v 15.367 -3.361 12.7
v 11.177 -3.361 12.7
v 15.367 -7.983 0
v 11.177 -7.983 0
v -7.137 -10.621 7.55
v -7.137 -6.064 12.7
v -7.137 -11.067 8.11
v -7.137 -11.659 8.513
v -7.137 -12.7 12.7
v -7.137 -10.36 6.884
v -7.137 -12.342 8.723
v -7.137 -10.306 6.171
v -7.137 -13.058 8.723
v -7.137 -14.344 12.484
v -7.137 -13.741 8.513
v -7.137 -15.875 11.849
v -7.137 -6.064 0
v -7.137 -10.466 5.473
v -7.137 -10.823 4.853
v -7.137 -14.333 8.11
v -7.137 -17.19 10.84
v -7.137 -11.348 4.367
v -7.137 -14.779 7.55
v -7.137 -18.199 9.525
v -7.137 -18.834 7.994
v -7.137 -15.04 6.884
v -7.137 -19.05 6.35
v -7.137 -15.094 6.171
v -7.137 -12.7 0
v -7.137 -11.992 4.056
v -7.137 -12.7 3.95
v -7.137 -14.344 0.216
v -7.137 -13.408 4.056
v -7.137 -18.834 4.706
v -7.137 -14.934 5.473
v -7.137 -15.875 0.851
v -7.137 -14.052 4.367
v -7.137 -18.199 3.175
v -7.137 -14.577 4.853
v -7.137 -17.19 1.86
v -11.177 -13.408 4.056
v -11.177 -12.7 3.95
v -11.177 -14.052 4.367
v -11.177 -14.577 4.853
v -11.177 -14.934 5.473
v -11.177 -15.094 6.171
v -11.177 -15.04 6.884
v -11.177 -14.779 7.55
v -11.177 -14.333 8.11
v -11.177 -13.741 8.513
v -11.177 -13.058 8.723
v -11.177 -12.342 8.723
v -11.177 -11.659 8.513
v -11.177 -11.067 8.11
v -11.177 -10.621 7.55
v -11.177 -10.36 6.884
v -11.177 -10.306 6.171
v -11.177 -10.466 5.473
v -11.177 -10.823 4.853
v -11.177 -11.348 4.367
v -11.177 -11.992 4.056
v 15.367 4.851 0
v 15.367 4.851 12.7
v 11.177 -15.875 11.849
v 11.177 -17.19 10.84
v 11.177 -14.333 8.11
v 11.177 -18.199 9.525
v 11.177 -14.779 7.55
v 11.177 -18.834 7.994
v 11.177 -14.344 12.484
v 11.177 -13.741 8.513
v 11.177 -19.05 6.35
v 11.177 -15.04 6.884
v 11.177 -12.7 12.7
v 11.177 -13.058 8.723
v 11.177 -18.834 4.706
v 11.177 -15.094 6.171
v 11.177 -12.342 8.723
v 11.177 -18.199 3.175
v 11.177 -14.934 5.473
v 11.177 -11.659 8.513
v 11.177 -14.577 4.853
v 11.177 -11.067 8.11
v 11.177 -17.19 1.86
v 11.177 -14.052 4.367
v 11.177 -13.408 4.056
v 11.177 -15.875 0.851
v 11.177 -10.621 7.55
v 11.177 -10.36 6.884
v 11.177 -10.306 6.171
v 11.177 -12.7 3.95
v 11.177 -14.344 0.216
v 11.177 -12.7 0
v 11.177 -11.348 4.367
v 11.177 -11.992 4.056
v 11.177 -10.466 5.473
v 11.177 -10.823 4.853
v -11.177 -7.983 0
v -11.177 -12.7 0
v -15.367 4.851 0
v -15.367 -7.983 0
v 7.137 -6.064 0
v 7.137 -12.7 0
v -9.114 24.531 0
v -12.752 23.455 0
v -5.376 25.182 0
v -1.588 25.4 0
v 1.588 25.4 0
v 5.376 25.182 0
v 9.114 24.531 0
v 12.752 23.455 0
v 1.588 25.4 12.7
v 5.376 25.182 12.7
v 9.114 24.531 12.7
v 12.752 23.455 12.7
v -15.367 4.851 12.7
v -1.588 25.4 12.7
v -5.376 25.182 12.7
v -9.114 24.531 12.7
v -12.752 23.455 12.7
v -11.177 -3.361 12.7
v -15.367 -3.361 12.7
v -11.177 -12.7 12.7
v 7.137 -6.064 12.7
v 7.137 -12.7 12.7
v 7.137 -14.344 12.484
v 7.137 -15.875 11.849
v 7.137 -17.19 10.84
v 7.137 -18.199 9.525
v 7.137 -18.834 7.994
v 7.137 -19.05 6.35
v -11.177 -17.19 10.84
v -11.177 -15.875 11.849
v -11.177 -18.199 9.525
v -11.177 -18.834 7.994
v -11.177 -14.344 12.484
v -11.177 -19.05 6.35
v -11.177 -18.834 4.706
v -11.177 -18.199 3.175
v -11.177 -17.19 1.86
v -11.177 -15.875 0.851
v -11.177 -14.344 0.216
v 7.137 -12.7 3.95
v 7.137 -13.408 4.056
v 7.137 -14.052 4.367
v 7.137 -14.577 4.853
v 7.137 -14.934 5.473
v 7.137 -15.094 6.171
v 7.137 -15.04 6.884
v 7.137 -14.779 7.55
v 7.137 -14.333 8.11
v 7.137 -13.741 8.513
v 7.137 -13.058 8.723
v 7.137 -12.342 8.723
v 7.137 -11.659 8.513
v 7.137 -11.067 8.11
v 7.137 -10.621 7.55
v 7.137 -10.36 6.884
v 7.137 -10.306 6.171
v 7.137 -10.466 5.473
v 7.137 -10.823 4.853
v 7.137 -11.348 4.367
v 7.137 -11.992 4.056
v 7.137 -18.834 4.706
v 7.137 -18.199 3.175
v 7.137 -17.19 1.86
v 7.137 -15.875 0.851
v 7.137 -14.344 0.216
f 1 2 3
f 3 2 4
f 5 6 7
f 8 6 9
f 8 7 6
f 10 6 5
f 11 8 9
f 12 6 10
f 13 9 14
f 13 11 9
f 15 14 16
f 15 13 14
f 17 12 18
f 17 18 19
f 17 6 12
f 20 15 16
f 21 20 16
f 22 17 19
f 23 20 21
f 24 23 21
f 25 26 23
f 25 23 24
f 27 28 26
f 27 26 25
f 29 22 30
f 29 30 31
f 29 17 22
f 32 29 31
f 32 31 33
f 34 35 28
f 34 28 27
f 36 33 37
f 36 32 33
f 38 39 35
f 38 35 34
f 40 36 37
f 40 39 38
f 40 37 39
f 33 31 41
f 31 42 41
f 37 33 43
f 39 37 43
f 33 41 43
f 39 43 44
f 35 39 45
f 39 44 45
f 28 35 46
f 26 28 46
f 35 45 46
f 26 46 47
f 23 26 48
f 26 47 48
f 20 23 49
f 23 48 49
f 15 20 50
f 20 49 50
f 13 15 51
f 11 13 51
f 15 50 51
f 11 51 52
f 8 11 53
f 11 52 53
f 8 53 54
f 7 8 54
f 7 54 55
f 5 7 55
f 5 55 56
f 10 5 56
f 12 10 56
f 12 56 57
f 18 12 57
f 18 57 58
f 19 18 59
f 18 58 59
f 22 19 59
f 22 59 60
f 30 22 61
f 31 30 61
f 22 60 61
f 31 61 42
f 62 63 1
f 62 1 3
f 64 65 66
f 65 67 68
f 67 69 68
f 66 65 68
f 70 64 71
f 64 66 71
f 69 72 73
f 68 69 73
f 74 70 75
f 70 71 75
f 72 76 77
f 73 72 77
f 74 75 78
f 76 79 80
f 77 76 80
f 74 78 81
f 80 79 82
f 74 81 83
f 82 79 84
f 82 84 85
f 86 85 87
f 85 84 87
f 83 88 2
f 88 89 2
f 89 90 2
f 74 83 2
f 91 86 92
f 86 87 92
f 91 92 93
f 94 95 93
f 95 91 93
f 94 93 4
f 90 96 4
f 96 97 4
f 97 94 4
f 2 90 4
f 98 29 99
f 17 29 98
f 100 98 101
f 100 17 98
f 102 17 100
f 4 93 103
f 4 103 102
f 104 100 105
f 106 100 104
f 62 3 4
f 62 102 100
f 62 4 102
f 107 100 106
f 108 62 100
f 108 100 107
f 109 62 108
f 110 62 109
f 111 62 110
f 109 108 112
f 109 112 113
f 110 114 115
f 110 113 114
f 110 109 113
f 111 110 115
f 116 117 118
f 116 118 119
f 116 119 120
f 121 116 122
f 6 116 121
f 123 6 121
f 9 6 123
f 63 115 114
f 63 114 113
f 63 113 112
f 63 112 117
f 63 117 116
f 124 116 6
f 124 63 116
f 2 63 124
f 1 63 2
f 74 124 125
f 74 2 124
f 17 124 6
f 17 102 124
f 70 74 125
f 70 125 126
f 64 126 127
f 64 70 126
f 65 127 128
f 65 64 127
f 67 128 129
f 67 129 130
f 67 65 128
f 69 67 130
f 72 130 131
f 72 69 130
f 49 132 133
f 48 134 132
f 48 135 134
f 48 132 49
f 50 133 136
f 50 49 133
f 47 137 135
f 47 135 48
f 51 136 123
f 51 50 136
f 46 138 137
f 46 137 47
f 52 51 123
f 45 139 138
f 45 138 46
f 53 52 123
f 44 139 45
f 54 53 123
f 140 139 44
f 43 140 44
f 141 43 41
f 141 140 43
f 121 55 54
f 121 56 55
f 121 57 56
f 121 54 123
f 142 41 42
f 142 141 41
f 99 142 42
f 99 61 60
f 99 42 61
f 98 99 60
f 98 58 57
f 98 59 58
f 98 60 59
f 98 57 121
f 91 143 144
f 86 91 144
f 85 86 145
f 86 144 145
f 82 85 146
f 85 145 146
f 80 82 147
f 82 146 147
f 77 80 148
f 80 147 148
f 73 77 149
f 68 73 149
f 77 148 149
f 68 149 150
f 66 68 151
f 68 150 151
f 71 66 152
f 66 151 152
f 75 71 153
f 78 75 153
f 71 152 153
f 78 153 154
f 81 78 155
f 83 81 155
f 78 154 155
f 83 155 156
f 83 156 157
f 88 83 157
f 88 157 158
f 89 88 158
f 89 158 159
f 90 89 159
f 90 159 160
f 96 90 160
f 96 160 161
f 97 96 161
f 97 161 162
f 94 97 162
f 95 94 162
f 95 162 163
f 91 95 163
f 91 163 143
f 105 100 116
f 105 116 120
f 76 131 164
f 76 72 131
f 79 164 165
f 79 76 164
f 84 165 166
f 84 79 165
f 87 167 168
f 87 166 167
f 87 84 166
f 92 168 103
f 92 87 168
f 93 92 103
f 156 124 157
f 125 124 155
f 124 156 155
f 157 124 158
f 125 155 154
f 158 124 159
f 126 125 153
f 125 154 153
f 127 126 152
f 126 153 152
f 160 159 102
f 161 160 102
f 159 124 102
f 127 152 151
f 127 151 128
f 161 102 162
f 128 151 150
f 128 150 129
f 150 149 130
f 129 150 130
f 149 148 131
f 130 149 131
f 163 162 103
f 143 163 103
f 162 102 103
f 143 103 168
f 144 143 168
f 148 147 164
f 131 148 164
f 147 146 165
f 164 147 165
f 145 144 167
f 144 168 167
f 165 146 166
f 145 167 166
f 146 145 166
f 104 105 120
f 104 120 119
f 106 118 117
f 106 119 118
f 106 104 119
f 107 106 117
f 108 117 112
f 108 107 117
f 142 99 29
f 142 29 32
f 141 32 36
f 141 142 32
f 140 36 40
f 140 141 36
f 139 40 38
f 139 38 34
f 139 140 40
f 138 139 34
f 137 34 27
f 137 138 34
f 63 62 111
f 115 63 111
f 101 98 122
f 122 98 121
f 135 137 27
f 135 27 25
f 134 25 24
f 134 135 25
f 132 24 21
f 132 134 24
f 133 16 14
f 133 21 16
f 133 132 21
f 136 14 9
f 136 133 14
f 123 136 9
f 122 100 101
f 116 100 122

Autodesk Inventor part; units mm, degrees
ref_plane "YZ Plane" through (0, 0, 0) normal (1, 0, 0) x (0, 1, 0)
ref_plane "XY Plane" through (0, 0, 0) normal (0, 0, 1) x (1, 0, 0)
sketch "Sketch1" plane through (0, 0, 0) normal (0, 0, 1) x (1, 0, 0)
  line L0 (0, -6.0638) -> (7.1374, -6.0638)
  line L1 (7.1374, -6.0638) -> (7.1374, -19.05)
  line L2 (7.1374, -19.05) -> (11.1772, -19.05)
  line L3 (11.1772, -19.05) -> (11.1772, 0)
  line L4 (11.1772, 0) -> (15.367, 0)
  line L5 (15.367, 0) -> (15.367, 4.8514)
  line L6 (15.367, 4.8514) -> (12.7524, 23.4552)
  arc A0 (12.7524, 23.4552) -> (1.5875, 25.4) centre (1.5875, -7.62) ccw
  line L7 (-21.5138, 0) -> (21.5138, 0) construction
  line L8 (0, -28.0365) -> (0, 34.8691) construction
  line L9 (0, -6.0638) -> (-7.1374, -6.0638)
  line L10 (-7.1374, -6.0638) -> (-7.1374, -19.05)
  line L11 (-7.1374, -19.05) -> (-11.1772, -19.05)
  line L12 (-11.1772, -19.05) -> (-11.1772, 0)
  line L13 (-11.1772, 0) -> (-15.367, 0)
  line L14 (-15.367, 0) -> (-15.367, 4.8514)
  line L15 (-15.367, 4.8514) -> (-12.7524, 23.4552)
  line L16 (7.1374, -12.7) -> (11.1772, -12.7) construction
  line L17 (-7.1374, -12.7) -> (-11.1772, -12.7) construction
  line L18 (1.5875, 25.4) -> (0, 25.4)
  arc A1 (-1.5875, 25.4) -> (-12.7524, 23.4552) centre (-1.5875, -7.62) ccw
  line L19 (-1.5875, 25.4) -> (0, 25.4)
  point P0 (0, 0)
  dimension "d1" = 30.734
  dimension "d2" = 4.1898
  dimension "d3" = 4.0398
  dimension "d4" = 6.35
  dimension "d5" = 12.7
  dimension "d6" = 17.5514
  dimension "d7" = 8
  dimension "d8" = 1.5875
  dimension "d9" = 38.1
  dimension "d10" = 33.02
extrude "Extrusion1" add sketch "Sketch1" along normal blind 12.7
hole "Hole1" at (11.1772, -12.7, 6.35) direction (-1, 0, 0) diameter 4.8006 end through all
fillet "Fillet1" radius 6.35 4 edges at (9.1573, -19.05, 12.7) (9.1573, -19.05, 0) (-9.1573, -19.05, 12.7) (-9.1573, -19.05, 0)
sketch "Sketch2" plane through (11.1772, 0, 12.7) normal (1, 0, 0) x (0, 0, -1)
  line L0 (12.7, 0) -> (0, 0) projected
  line L1 (0, -12.7) -> (0, 0) construction
  line L2 (12.7, -12.7) -> (12.7, 0) construction
  line L3 (0, -3.361) -> (12.7, -7.9834)
  line L4 (12.7, 0) -> (12.7, -7.9834)
  line L5 (0, -3.361) -> (0, 0)
  point P0 (6.35, -12.7)
  dimension "d23" = 6.604
  dimension "d24" = 20
extrude "Extrusion2" add sketch "Sketch2" along normal up to surface (4.1898 mm away)
mirror "Mirror1" about plane through (0, 0, 0) normal (1, 0, 0) of "Extrusion2"
ref_plane "Work Plane1" through (0, 0, 6.35) normal (0, 0, -1) x (-1, 0, 0)
ref_plane "Work Plane2" through (11.1772, -12.7, 0) normal (0, 1, 0) x (-1, 0, 0)
equation "\"d1\" = finger_w"
equation "\"d2\" = finger_link_w + tol"
equation "\"d3\" = finger_link_w - tol"
equation "\"d4\" = 0.5 * finger_t"
equation "\"d11\" = finger_t"
equation "\"d15\" = bore_clearance"
equation "\"d22\" = 0.5 * finger_t"
equation "\"d25\" = finger_t"
equation "\"finger_A_l\" = 57.15"
equation "\"finger_w\" = 30.734"
equation "\"finger_B_l\" = 38.1"
equation "\"finger_link_w\" = 4.1148"
equation "\"tolerance1\" = 0.15"
equation "\"tol\" = 0.5 * tolerance1"
equation "\"finger_t\" = 12.7"
equation "\"bore_press\" = 4.8006"
equation "\"bore_clearance\" = bore_press"
properties part number "finger_tip"
